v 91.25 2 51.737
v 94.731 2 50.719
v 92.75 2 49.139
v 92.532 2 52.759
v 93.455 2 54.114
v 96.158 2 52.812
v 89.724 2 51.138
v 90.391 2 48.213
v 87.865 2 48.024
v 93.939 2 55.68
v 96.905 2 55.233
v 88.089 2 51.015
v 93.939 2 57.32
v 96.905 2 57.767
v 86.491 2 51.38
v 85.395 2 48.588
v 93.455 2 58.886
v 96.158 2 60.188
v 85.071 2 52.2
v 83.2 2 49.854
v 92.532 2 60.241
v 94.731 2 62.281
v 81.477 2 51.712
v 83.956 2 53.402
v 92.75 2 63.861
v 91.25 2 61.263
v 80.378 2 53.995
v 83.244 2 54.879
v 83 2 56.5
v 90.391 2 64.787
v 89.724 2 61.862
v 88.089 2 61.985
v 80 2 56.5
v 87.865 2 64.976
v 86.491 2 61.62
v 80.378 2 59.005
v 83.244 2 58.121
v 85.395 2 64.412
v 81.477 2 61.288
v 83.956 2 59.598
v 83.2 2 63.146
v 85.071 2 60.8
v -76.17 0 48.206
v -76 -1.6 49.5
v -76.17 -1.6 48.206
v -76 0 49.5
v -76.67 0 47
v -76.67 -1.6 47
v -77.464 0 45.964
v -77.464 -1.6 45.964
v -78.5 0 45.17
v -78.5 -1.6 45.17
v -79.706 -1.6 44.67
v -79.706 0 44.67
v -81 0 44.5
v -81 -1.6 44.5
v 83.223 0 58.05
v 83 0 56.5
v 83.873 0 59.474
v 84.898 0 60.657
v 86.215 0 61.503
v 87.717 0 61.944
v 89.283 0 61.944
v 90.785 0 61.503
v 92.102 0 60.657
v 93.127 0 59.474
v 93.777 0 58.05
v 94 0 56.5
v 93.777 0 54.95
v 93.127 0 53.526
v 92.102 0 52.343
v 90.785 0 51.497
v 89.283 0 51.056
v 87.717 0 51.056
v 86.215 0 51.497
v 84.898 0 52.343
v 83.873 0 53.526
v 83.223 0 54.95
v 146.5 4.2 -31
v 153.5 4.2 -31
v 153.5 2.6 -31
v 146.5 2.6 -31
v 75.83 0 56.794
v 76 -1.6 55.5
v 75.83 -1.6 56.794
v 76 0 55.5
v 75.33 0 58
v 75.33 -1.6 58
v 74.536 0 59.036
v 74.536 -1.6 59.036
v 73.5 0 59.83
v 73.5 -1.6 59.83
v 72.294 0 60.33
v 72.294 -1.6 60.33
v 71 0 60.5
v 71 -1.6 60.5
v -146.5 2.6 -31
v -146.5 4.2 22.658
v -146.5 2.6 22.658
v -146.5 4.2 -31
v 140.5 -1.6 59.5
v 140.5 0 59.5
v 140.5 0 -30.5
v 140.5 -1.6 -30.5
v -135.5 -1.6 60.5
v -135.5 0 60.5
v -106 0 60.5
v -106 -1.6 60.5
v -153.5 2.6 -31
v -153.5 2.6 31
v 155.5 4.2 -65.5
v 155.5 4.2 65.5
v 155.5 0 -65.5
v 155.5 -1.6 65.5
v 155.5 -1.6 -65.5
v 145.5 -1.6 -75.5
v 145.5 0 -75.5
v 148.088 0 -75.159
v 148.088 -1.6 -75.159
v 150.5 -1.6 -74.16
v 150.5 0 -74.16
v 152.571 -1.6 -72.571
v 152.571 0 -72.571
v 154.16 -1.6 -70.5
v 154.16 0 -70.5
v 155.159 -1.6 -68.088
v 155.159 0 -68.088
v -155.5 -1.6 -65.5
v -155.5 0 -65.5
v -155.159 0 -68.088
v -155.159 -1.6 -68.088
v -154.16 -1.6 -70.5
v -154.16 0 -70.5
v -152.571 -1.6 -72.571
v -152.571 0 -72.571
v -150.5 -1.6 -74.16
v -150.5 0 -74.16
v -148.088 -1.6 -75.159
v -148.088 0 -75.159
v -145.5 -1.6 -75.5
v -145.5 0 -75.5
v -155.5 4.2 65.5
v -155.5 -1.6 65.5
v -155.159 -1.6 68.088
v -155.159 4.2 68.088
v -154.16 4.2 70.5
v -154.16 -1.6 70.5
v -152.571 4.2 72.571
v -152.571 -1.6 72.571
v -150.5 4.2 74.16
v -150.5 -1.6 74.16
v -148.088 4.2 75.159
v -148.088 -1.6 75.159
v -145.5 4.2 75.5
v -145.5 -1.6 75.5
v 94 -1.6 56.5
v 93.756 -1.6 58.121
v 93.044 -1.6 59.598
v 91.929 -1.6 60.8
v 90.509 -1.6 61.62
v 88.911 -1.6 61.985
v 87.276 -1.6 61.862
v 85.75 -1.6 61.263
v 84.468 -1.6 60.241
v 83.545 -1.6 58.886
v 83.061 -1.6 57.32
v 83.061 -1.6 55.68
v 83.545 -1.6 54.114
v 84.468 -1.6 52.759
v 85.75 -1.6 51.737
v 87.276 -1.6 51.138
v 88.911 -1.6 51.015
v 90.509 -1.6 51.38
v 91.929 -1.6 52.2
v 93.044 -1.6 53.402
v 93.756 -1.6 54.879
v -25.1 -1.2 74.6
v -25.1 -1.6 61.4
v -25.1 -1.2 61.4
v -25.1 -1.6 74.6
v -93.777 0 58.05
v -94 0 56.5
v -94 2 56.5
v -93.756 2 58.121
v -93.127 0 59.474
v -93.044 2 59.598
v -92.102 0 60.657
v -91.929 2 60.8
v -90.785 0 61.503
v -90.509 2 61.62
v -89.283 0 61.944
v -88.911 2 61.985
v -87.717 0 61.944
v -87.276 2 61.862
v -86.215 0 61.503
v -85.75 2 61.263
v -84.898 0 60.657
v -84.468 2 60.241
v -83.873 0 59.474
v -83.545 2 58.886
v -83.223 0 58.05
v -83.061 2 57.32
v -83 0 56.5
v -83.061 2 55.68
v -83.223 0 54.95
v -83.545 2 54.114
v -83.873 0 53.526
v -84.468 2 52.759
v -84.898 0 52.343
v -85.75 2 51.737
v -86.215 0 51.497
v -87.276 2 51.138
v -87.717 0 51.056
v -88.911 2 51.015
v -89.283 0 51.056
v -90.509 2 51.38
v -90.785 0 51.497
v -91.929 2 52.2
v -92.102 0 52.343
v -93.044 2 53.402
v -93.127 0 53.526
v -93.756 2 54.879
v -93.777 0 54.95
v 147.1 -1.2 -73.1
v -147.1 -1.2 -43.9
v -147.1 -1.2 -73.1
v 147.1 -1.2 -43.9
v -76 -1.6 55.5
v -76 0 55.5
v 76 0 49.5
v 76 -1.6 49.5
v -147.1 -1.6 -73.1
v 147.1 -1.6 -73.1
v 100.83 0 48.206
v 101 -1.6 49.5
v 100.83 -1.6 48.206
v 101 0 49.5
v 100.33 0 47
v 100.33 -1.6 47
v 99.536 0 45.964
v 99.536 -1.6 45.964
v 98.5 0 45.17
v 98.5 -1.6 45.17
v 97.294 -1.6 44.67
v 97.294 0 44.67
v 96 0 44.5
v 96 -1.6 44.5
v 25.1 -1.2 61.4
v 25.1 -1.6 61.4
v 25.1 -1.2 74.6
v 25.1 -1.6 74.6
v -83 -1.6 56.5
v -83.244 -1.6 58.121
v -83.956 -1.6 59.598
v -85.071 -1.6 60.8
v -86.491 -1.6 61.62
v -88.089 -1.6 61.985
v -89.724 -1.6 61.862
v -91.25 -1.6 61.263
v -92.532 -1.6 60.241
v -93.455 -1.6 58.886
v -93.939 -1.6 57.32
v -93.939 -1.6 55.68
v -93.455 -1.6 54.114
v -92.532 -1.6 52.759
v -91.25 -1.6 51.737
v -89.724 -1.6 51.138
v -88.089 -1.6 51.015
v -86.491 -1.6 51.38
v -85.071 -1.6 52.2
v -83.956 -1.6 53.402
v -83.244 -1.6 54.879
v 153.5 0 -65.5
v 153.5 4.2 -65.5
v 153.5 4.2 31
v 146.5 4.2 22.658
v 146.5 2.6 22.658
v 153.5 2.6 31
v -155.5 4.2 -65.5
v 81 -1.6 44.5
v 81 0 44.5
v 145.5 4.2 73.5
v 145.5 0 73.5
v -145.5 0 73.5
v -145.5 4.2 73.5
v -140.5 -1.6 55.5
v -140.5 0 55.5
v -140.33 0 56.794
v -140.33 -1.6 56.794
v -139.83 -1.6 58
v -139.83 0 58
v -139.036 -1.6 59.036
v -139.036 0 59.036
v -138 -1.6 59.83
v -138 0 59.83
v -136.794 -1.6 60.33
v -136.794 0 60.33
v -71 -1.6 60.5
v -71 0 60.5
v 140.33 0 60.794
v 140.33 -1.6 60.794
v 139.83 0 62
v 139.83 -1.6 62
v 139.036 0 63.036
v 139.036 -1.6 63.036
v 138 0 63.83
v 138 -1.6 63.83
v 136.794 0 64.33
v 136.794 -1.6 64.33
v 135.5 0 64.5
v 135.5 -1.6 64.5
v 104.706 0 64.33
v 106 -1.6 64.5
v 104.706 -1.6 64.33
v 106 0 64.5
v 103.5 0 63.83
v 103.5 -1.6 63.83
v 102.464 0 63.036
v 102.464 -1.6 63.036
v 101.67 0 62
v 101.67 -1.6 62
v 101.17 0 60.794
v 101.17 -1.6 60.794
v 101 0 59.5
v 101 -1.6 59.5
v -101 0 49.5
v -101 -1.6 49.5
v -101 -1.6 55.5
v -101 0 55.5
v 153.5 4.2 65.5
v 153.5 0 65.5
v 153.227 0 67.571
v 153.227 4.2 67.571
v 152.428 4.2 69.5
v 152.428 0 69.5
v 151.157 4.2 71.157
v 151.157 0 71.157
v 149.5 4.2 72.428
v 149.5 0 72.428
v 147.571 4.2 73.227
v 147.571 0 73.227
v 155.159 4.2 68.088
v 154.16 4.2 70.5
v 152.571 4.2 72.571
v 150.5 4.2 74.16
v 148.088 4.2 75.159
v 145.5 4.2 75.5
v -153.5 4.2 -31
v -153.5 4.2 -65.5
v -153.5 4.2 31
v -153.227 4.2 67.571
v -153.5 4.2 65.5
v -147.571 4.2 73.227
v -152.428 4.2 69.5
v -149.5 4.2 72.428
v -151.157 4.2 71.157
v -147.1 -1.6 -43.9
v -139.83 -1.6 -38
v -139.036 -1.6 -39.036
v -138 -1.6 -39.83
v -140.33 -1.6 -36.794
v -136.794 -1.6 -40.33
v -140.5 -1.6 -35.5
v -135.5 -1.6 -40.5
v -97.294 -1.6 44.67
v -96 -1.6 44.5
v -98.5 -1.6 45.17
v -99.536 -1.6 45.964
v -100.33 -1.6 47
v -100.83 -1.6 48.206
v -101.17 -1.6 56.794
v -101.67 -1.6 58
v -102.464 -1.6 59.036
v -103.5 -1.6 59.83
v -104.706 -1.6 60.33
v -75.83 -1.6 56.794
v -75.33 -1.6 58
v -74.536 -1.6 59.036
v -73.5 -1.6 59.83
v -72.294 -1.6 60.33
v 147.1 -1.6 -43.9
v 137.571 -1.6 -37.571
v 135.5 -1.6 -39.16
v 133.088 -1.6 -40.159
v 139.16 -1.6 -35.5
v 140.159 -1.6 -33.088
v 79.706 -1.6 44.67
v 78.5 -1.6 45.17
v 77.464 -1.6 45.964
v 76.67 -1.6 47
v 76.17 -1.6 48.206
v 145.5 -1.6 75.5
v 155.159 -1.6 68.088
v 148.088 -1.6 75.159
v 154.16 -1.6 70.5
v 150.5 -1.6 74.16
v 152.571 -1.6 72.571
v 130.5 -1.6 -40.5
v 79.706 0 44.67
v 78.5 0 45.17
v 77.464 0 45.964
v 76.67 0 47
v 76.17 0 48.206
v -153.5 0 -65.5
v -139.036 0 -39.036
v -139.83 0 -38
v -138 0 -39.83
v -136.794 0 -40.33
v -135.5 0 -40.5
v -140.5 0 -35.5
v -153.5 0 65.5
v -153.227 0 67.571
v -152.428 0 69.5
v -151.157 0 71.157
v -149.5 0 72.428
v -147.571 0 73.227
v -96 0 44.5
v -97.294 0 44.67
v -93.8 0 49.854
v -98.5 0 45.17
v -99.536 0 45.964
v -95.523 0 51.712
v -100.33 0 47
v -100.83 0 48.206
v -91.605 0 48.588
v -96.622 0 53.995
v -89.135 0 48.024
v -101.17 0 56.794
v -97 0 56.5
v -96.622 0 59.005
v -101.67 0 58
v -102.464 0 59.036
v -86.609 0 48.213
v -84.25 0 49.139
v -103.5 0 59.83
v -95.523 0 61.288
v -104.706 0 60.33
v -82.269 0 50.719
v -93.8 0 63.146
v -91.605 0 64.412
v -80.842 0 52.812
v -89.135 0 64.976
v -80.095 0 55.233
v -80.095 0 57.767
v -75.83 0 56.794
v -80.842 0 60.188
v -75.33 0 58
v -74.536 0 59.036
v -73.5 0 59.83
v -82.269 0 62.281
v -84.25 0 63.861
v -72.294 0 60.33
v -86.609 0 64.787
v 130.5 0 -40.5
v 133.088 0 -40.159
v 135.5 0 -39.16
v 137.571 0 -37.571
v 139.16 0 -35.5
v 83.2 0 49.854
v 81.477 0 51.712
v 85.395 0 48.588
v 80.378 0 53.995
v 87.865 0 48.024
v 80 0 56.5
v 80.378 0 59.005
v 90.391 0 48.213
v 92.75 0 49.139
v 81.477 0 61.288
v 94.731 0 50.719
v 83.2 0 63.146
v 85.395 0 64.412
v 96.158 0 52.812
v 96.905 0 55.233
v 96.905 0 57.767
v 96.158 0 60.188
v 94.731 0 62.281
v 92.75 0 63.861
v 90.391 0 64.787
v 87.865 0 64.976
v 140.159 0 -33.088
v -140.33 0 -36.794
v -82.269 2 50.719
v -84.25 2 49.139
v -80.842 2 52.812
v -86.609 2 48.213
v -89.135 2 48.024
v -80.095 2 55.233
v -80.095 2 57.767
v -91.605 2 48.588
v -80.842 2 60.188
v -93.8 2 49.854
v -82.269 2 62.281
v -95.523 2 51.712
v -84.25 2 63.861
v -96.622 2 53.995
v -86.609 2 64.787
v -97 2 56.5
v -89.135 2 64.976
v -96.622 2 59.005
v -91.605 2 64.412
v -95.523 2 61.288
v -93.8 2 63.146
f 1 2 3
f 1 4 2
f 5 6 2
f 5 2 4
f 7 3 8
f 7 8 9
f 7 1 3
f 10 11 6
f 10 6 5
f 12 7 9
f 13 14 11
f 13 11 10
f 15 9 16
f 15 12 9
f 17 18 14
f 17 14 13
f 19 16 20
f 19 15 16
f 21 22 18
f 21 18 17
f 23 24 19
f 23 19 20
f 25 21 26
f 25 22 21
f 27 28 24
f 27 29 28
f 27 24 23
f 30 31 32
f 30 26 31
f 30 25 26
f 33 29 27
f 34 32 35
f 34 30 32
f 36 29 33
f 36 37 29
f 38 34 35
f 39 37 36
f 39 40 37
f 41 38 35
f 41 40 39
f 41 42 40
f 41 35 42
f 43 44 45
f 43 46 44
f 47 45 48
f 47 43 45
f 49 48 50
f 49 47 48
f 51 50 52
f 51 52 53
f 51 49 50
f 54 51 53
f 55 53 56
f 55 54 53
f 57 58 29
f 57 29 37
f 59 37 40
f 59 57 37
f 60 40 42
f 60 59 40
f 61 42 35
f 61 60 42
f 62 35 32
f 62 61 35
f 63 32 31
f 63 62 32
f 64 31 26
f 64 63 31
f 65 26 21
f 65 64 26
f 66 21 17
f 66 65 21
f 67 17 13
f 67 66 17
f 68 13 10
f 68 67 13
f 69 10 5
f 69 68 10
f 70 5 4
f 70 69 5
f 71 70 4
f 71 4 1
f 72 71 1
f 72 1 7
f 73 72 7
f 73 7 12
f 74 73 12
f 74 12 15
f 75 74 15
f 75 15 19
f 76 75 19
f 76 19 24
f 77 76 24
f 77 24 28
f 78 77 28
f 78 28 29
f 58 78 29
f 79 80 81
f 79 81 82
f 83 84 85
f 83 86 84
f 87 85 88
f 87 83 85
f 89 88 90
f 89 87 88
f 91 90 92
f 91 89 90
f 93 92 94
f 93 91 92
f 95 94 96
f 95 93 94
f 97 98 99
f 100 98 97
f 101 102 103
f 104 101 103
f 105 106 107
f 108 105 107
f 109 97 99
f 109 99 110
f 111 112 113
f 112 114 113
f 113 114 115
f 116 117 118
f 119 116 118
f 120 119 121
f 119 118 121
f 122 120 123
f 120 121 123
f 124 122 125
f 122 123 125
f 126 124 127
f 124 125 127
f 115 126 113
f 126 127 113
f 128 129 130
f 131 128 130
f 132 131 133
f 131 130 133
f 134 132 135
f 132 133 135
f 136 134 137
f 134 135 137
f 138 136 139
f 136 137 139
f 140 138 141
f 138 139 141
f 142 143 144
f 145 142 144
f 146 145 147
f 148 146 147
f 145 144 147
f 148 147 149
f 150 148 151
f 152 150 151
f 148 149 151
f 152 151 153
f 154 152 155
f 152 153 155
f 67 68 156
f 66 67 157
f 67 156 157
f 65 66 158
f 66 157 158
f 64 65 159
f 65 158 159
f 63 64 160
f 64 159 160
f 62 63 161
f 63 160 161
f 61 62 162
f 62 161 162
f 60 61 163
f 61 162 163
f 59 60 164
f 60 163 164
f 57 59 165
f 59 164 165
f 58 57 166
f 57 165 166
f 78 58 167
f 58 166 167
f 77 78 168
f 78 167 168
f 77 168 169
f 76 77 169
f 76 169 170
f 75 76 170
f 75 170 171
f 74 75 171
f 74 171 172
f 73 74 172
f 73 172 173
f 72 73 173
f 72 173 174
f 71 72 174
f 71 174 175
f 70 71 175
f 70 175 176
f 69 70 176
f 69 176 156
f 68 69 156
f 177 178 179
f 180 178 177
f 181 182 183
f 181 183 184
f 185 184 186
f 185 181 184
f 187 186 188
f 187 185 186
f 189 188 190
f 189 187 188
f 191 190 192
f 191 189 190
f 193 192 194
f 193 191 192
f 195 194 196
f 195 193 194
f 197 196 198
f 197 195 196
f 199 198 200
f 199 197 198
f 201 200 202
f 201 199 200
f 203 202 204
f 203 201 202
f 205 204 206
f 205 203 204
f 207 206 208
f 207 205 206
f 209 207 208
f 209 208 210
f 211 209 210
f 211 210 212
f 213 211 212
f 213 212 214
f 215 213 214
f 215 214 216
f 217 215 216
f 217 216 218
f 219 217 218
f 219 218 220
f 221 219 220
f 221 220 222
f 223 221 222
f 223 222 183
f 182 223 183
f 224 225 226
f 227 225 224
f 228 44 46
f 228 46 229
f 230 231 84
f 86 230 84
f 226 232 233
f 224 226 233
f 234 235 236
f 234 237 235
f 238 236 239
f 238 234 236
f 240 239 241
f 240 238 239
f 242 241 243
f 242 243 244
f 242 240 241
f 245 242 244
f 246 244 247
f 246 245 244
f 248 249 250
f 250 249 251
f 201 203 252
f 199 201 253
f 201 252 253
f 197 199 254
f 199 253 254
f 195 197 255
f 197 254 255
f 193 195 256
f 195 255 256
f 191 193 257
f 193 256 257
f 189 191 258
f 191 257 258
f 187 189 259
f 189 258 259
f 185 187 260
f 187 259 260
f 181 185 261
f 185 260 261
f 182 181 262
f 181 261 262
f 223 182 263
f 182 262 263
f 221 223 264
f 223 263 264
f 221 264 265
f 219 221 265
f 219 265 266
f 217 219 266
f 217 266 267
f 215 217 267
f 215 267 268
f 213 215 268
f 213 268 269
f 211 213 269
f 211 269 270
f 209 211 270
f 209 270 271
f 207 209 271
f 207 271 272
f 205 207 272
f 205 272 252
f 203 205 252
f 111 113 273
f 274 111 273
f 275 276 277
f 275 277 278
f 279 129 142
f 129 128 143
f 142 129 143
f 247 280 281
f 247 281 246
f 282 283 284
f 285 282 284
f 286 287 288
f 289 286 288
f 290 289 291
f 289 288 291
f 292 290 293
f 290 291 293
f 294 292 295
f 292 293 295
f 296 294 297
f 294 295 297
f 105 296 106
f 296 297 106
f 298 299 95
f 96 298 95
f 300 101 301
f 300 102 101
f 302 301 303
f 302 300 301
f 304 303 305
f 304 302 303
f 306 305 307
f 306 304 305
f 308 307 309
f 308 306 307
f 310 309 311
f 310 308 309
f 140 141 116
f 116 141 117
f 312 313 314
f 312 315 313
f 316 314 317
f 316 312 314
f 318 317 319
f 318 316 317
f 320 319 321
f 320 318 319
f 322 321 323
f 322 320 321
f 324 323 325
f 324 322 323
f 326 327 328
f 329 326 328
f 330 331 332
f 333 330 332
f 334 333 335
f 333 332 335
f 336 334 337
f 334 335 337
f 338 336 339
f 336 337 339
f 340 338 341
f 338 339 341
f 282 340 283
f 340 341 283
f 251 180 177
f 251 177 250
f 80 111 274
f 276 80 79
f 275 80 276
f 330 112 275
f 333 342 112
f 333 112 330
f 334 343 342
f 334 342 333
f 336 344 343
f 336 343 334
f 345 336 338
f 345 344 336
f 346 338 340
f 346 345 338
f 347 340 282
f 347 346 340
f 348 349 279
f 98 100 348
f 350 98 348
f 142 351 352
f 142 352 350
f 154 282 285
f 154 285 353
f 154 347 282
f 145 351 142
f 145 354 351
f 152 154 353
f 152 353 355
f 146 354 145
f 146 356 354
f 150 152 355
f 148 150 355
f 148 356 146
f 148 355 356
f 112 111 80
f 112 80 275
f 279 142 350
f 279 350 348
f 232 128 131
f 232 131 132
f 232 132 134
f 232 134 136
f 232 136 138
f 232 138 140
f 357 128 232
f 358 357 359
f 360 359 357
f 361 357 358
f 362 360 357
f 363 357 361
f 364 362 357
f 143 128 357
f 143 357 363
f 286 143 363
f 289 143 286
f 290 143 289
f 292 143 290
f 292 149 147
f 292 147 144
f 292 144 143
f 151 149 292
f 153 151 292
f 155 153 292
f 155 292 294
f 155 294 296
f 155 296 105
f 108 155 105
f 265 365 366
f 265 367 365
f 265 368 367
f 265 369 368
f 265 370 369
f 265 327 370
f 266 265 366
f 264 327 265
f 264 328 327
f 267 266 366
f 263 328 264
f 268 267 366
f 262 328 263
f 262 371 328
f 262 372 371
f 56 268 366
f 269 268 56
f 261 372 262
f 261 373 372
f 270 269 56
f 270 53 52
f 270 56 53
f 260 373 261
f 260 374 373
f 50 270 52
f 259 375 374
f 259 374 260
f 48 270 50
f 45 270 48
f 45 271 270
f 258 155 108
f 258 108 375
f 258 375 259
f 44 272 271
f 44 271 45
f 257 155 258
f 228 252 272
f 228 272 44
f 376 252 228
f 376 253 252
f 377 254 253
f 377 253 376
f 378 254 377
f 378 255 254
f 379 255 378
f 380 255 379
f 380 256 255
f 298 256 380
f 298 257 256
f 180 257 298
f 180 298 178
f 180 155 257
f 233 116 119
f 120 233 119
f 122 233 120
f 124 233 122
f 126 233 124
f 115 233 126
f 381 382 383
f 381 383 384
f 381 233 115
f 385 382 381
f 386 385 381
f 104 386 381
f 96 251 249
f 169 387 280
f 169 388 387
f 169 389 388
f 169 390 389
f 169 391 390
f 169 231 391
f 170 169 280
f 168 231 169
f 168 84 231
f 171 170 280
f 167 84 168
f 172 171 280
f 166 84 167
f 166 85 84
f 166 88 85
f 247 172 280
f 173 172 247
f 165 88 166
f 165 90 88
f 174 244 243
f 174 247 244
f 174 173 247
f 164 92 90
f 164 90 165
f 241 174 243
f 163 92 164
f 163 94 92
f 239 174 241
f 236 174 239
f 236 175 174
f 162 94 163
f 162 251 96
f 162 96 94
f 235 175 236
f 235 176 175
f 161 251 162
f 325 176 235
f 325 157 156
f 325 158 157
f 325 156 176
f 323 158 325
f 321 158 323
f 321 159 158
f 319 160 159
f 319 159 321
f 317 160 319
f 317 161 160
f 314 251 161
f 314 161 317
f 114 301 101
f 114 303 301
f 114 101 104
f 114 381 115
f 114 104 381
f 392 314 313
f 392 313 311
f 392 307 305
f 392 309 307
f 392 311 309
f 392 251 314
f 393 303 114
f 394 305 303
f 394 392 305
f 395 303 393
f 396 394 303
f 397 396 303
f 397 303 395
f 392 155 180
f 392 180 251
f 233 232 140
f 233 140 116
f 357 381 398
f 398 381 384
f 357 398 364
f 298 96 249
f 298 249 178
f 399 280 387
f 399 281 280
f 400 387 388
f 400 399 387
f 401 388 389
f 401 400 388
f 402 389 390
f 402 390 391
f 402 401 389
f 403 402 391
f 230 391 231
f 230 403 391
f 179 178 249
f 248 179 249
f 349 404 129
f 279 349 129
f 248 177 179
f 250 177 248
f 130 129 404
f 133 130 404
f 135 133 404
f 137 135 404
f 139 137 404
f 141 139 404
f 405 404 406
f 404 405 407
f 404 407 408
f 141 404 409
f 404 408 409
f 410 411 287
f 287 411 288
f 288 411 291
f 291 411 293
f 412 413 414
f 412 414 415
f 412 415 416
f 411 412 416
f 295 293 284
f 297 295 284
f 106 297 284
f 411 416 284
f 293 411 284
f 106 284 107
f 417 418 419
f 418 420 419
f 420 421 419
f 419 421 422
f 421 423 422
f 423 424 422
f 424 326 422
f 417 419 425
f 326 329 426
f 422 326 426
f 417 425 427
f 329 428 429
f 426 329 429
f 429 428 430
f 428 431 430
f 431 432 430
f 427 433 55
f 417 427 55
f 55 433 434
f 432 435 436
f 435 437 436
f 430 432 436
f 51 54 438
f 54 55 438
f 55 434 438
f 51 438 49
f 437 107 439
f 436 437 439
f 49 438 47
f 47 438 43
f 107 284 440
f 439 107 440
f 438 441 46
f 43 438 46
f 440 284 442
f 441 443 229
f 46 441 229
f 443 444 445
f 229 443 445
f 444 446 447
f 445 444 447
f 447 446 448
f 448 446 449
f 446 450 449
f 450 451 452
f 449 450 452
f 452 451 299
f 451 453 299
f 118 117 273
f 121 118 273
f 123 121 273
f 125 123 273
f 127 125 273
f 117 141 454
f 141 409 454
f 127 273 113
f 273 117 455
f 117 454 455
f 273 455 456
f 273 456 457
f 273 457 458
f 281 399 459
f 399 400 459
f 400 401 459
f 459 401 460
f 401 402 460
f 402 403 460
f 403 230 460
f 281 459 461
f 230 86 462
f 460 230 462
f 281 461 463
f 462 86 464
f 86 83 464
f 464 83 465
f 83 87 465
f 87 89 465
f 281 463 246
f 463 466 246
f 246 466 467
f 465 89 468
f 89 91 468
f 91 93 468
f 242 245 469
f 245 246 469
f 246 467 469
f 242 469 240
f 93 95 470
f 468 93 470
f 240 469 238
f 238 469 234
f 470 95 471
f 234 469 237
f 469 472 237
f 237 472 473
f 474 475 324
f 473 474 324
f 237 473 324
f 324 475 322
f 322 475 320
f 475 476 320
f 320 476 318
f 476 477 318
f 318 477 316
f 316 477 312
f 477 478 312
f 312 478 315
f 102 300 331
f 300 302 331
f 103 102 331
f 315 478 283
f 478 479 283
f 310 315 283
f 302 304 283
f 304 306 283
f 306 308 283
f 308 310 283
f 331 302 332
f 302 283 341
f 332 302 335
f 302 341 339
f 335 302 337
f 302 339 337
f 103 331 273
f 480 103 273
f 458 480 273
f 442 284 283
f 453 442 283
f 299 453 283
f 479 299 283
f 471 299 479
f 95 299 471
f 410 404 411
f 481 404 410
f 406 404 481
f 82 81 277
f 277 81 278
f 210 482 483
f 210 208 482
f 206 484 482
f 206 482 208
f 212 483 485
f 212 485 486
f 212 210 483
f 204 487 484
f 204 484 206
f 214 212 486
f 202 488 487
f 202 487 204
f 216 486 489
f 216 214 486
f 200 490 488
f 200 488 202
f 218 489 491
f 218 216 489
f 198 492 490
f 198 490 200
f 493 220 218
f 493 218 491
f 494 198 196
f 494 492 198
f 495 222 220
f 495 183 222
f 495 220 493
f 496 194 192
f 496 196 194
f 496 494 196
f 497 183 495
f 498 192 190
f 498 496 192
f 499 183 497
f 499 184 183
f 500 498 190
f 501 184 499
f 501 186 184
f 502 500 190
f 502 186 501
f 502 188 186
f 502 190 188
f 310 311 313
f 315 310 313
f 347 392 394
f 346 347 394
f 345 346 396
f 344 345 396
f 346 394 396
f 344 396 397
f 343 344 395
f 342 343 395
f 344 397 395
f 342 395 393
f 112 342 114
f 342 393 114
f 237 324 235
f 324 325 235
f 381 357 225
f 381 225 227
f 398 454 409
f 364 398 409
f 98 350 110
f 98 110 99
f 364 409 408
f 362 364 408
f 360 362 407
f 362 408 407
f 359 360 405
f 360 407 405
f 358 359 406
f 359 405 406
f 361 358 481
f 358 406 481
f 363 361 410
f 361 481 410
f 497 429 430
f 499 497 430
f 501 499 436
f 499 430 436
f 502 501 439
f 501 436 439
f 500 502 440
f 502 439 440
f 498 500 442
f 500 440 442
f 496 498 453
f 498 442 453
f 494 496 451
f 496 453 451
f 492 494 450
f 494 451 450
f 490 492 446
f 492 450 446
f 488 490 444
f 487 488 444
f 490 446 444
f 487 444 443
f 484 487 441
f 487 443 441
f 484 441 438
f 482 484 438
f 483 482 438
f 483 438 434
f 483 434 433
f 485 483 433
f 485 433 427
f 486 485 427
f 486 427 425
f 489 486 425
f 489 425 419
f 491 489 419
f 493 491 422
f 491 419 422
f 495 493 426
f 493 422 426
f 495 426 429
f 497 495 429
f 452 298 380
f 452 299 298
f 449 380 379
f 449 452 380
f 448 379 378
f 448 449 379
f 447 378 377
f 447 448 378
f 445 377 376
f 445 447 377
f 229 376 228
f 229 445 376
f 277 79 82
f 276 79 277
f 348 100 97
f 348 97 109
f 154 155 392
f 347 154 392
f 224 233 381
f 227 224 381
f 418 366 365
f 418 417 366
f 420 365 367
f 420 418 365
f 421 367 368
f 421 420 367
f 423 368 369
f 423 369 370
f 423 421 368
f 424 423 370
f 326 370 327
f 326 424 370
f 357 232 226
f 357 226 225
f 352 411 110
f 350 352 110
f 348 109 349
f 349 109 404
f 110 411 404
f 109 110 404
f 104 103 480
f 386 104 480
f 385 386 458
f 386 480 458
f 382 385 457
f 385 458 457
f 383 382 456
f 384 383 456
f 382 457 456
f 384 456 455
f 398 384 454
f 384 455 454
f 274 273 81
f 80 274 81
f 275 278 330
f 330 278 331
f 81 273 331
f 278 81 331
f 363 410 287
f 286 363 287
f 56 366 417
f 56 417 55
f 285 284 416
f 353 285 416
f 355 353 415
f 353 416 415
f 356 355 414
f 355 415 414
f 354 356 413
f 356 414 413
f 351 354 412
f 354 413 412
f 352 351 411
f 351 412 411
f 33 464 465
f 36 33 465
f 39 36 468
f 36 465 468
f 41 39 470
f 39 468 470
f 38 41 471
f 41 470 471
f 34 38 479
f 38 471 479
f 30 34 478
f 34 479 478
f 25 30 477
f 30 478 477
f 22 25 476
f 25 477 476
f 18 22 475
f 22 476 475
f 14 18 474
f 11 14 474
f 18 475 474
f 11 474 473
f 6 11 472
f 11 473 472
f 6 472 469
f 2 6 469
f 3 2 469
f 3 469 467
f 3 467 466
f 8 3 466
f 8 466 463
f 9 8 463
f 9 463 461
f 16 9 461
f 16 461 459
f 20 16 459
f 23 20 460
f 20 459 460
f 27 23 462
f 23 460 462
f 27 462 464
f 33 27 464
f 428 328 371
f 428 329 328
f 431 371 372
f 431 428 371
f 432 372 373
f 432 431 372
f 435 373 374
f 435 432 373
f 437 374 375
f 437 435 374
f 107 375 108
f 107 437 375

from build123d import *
from build123d import SkipClean  # not in build123d's __all__

# Parameters (mm, degrees)
F1_DEPTH  = 1.6
F2_W      = 25
F2_H      = 16
F3_DEPTH  = 1.6
F5_DEPTH  = 25
F6_R      = 5
F8_R      = 5.5
F9_DEPTH  = 25
F12_R     = 8.5
F12_R_2   = 5.5
F13_DEPTH = 2
F15_DEPTH = 4.2
F17_DEPTH = 1.6
F19_W     = 294.2
F19_H     = 29.2
F19_W_2   = 50.2
F19_H_2   = 13.2
F20_DEPTH = 0.4


# Not quite as in the source:
# - two fillets or chamfers of one size are made in one step
# - after a boolean that leaves OpenCascade's solid faulty, fix() repairs it


with BuildPart() as f1:
    # F0 (on Front) → F1 (new body)
    with BuildSketch(Plane.XZ):
        with BuildLine():
            ThreePointArc((155.5, 65.5), (152.5710678119, 72.5710678119), (145.5, 75.5))
            Line((145.5, 75.5), (-145.5, 75.5))
            ThreePointArc((-145.5, 75.5), (-152.5710678119, 72.5710678119), (-155.5, 65.5))
            Line((-155.5, 65.5), (-155.5, -65.5))
            ThreePointArc((-155.5, -65.5), (-152.5710678119, -72.5710678119), (-145.5, -75.5))
            Line((-145.5, -75.5), (145.5, -75.5))
            ThreePointArc((145.5, -75.5), (152.5710678119, -72.5710678119), (155.5, -65.5))
            Line((155.5, -65.5), (155.5, 65.5))
        make_face()
        with BuildLine():
            Line((-135.5, 60.5), (135.5, 60.5))
            ThreePointArc((135.5, 60.5), (139.0355339059, 59.0355339059), (140.5, 55.5))
            Line((140.5, 55.5), (140.5, -30.5))
            ThreePointArc((140.5, -30.5), (137.5710678119, -37.5710678119), (130.5, -40.5))
            Line((130.5, -40.5), (-135.5, -40.5))
            ThreePointArc((-135.5, -40.5), (-139.0355339059, -39.0355339059), (-140.5, -35.5))
            Line((-140.5, -35.5), (-140.5, 55.5))
            ThreePointArc((-140.5, 55.5), (-139.0355339059, 59.0355339059), (-135.5, 60.5))
        make_face(mode=Mode.SUBTRACT)
    extrude(amount=F1_DEPTH)

    # F2 (on face) → F3 (join, through all)
    with BuildSketch(Plane.XZ.offset(1.6)):
        with Locations((-88.5, 52.5)):
            Rectangle(F2_W, F2_H)
        with Locations((88.5, 52.5)):
            Rectangle(F2_W, F2_H)
    extrude(amount=-F3_DEPTH)

    # F4 (on face) → F5 (cut)
    with BuildSketch(Plane.XZ.offset(1.6)):
        Polygon((101, 64.5), (101, 60.5), (101, 55.5), (140.5, 55.5), (140.5, 64.5), align=None)
    extrude(amount=-F5_DEPTH, mode=Mode.SUBTRACT)

    # F6
    f6_edges = [f1.edges().sort_by_distance(p)[0] for p in [
        (-101, -0.8, 44.5),
        (-101, -0.8, 60.5),
        (-76, -0.8, 44.5),
        (-76, -0.8, 60.5),
        (101, -0.8, 44.5),
        (76, -0.8, 44.5),
        (76, -0.8, 60.5),
        (140.5, -0.8, 64.5),
        (101, -0.8, 64.5),
    ]]
    fillet(f6_edges, radius=F6_R)

    # F8 (on face) → F9 (cut)
    with BuildSketch(Plane.XZ.offset(1.6)):
        with Locations((-88.5, 56.5)):
            Circle(F8_R)
        with Locations((88.5, 56.5)):
            Circle(F8_R)
    extrude(amount=-F9_DEPTH, mode=Mode.SUBTRACT)

    # F12 (on face) → F13 (join)
    with BuildSketch(Plane(origin=(0, 0, 0), x_dir=(-1, 0, 0), z_dir=(0, 1, 0))):
        with Locations((-88.5, 56.5)):
            Circle(F12_R)
        with Locations((-88.5, 56.5)):
            Circle(F12_R_2, mode=Mode.SUBTRACT)
        with Locations((88.5, 56.5)):
            Circle(F12_R)
        with Locations((88.5, 56.5)):
            Circle(F12_R_2, mode=Mode.SUBTRACT)
    with SkipClean():  # cleaning this boolean's faces spoils the solid; the shape is the same uncleaned
        extrude(amount=F13_DEPTH)

    # F14 (on face) → F15 (join)
    with BuildSketch(Plane(origin=(0, 0, 0), x_dir=(-1, 0, 0), z_dir=(0, 1, 0))):
        with BuildLine():
            ThreePointArc((-145.5, 75.5), (-152.5710678119, 72.5710678119), (-155.5, 65.5))
            Line((-155.5, 65.5), (-155.5, -65.5))
            Line((-155.5, -65.5), (-153.5, -65.5))
            Line((-153.5, -65.5), (-153.5, 65.5))
            ThreePointArc((-153.5, 65.5), (-151.1568542495, 71.1568542495), (-145.5, 73.5))
            Line((-145.5, 73.5), (145.5, 73.5))
            ThreePointArc((145.5, 73.5), (151.1568542495, 71.1568542495), (153.5, 65.5))
            Line((153.5, 65.5), (153.5, -65.5))
            Line((153.5, -65.5), (155.5, -65.5))
            Line((155.5, -65.5), (155.5, 65.5))
            ThreePointArc((155.5, 65.5), (152.5710678119, 72.5710678119), (145.5, 75.5))
            Line((145.5, 75.5), (-145.5, 75.5))
        make_face()
    extrude(amount=F15_DEPTH)

    add(f1.part.fix(), mode=Mode.REPLACE)

    # F16 (on face) → F17 (join)
    with BuildSketch(Plane(origin=(0, 4.2, 0), x_dir=(-1, 0, 0), z_dir=(0, 1, 0))):
        Polygon((-153.5, 31), (-153.5, -31), (-146.5, -31), (-146.5, 22.6577248518), align=None)
        Polygon((146.5, -31), (153.5, -31), (153.5, 31), (146.5, 22.6577248518), align=None)
    extrude(amount=-F17_DEPTH)

    # F19 (on face) → F20 (cut)
    with BuildSketch(Plane.XZ.offset(1.6)):
        with Locations((0, -58.5)):
            Rectangle(F19_W, F19_H)
        with Locations((0, 68)):
            Rectangle(F19_W_2, F19_H_2)
    extrude(amount=-F20_DEPTH, mode=Mode.SUBTRACT)


solid = f1.part
